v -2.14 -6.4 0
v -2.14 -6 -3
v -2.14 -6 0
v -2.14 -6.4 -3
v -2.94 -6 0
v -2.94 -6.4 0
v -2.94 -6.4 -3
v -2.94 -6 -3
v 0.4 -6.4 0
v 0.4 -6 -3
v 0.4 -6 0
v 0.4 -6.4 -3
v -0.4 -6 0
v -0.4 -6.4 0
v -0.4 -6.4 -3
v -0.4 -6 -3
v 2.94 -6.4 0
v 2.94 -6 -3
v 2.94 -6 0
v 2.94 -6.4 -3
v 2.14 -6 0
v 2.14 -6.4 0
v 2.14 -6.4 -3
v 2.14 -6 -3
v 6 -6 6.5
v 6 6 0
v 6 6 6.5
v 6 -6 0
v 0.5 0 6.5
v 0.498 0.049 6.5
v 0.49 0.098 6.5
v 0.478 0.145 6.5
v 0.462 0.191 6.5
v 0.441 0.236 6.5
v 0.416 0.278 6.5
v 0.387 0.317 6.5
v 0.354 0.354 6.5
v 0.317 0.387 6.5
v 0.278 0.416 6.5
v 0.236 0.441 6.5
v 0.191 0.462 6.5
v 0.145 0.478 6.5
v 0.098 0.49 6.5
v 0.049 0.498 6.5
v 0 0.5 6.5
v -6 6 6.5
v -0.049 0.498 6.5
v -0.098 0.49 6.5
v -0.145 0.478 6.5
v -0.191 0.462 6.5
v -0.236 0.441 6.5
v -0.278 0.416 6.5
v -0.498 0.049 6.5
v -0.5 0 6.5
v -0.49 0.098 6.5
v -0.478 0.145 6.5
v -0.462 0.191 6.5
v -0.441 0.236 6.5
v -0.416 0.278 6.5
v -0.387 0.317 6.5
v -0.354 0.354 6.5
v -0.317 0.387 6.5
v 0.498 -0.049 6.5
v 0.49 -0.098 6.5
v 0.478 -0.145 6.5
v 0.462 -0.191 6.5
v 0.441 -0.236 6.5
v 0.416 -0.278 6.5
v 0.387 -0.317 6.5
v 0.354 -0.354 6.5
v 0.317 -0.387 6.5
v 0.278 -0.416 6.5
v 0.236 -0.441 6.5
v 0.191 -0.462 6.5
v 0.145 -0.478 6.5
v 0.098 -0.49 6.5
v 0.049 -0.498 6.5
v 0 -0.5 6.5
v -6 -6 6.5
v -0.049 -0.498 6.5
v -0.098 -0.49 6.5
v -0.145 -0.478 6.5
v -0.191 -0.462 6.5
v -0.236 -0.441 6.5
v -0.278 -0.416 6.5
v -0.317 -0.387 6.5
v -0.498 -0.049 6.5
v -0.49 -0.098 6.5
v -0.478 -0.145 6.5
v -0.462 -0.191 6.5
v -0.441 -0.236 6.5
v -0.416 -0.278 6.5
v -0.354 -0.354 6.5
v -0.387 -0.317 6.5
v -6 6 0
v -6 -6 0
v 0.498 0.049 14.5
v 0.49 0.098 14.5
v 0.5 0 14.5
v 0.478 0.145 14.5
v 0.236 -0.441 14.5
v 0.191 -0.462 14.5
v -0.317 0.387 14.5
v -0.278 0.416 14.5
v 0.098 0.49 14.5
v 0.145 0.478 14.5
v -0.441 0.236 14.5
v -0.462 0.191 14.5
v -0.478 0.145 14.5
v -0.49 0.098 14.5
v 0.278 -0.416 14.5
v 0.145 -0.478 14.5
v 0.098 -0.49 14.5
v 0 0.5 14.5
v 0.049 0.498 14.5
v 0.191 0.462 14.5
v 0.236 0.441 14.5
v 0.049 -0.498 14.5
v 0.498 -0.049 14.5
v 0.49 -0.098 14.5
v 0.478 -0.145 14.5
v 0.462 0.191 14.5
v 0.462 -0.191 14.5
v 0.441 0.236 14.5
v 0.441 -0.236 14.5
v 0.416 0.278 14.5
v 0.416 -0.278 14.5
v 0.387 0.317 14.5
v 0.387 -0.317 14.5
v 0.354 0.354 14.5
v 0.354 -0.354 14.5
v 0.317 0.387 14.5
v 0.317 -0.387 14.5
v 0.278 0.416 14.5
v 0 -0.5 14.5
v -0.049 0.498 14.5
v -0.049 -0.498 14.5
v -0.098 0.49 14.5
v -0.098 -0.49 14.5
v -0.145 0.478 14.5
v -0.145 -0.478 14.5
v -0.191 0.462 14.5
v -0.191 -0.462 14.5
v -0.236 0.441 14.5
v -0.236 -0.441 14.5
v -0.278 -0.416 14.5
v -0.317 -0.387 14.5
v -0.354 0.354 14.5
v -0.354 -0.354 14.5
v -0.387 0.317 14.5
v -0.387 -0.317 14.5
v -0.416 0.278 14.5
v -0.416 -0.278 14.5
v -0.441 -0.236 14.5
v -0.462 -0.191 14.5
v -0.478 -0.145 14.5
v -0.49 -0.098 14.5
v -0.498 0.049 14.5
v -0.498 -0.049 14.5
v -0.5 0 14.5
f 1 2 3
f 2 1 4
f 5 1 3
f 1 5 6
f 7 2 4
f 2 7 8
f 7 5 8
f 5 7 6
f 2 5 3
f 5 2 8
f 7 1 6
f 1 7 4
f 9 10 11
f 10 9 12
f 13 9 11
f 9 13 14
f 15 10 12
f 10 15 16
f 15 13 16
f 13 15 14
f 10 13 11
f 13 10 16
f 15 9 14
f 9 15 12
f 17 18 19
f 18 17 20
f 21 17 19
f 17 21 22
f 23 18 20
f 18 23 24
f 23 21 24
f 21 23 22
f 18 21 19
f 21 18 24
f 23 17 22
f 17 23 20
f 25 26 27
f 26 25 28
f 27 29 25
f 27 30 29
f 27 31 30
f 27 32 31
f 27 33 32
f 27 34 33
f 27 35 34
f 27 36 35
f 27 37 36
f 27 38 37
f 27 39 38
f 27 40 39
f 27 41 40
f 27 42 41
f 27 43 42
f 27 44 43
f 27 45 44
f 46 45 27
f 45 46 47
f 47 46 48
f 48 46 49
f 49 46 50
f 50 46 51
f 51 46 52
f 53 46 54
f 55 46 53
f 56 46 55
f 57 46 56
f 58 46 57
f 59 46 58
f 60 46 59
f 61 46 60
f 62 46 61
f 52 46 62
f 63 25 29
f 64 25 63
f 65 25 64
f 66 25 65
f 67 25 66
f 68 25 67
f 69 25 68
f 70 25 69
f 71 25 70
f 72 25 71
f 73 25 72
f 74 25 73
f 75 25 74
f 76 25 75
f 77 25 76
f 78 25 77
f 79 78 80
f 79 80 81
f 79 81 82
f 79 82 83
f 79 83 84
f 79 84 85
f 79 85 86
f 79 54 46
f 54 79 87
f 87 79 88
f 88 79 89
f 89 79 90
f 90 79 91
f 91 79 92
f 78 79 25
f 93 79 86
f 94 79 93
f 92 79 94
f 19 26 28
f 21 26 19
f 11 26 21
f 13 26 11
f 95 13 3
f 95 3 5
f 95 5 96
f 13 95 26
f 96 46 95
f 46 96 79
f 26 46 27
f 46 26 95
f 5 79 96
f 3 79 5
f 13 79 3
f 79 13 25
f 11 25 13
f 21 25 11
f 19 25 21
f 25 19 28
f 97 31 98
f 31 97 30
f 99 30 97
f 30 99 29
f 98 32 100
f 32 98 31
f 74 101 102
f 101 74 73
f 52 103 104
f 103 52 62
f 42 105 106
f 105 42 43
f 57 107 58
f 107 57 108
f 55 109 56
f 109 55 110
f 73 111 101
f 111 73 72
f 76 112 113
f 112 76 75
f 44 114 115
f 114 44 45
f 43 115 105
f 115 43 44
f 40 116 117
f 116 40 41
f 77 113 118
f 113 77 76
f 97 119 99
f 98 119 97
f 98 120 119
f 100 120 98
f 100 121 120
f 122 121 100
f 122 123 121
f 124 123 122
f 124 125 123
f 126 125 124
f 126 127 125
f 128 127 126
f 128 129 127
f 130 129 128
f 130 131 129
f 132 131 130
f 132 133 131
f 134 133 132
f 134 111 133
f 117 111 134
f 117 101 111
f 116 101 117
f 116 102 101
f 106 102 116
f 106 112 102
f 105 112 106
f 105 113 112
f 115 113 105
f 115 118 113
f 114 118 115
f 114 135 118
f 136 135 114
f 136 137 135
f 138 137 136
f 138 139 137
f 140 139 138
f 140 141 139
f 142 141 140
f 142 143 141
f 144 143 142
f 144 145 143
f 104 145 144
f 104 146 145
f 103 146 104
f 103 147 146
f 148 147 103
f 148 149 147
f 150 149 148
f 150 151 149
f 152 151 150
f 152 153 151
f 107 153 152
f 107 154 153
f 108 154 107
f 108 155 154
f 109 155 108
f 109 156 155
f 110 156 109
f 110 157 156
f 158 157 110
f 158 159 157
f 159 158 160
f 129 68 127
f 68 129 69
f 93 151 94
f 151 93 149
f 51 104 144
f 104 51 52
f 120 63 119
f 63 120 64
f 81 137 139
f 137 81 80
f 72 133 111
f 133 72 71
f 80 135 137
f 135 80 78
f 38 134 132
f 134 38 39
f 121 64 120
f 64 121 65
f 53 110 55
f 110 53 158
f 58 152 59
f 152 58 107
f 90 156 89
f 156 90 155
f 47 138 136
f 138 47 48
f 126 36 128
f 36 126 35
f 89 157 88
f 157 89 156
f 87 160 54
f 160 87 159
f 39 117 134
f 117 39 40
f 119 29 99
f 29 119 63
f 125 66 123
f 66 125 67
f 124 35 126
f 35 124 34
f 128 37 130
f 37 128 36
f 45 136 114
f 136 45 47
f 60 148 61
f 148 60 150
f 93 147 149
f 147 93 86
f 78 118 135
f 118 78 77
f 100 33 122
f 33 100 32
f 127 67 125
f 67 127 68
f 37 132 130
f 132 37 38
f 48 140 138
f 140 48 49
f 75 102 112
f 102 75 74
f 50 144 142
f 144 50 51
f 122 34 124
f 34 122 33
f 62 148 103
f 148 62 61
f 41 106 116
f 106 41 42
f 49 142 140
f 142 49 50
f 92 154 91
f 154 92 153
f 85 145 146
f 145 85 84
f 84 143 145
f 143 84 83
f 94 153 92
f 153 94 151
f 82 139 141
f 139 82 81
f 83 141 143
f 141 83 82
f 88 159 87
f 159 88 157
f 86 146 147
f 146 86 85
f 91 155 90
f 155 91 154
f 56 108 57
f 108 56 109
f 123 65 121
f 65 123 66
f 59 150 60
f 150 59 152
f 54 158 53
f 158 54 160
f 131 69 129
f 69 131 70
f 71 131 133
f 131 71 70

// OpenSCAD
$fn=64;

dims = [12, 12, 6.5, 1.0]; // [body_x, body_y, body_z, shaft_d]

module pot_body(bx, by, bz) {
    translate([0,0,bz/2])
        cube([bx, by, bz], center=true);
}

module pot_shaft(shaft_d, bz) {
    shaft_h = 8;
    translate([0,0,bz + shaft_h/2])
        cylinder(d=shaft_d, h=shaft_h, center=true);
}

module pot_pins(bx, by) {
    pin_w = 0.8;
    pin_t = 0.4;
    pin_h = 3.0;
    pin_spacing = 2.54;
    y_off = -by/2 - pin_t/2;
    for (i=[-1,0,1]) {
        translate([i*pin_spacing, y_off, -pin_h/2])
            cube([pin_w, pin_t, pin_h], center=true);
    }
}

module potentiometer(d) {
    bx = d[0];
    by = d[1];
    bz = d[2];
    shaft_d = d[3];

    union() {
        pot_body(bx, by, bz);
        pot_shaft(shaft_d, bz);
        pot_pins(bx, by);
    }
}

potentiometer(dims);
